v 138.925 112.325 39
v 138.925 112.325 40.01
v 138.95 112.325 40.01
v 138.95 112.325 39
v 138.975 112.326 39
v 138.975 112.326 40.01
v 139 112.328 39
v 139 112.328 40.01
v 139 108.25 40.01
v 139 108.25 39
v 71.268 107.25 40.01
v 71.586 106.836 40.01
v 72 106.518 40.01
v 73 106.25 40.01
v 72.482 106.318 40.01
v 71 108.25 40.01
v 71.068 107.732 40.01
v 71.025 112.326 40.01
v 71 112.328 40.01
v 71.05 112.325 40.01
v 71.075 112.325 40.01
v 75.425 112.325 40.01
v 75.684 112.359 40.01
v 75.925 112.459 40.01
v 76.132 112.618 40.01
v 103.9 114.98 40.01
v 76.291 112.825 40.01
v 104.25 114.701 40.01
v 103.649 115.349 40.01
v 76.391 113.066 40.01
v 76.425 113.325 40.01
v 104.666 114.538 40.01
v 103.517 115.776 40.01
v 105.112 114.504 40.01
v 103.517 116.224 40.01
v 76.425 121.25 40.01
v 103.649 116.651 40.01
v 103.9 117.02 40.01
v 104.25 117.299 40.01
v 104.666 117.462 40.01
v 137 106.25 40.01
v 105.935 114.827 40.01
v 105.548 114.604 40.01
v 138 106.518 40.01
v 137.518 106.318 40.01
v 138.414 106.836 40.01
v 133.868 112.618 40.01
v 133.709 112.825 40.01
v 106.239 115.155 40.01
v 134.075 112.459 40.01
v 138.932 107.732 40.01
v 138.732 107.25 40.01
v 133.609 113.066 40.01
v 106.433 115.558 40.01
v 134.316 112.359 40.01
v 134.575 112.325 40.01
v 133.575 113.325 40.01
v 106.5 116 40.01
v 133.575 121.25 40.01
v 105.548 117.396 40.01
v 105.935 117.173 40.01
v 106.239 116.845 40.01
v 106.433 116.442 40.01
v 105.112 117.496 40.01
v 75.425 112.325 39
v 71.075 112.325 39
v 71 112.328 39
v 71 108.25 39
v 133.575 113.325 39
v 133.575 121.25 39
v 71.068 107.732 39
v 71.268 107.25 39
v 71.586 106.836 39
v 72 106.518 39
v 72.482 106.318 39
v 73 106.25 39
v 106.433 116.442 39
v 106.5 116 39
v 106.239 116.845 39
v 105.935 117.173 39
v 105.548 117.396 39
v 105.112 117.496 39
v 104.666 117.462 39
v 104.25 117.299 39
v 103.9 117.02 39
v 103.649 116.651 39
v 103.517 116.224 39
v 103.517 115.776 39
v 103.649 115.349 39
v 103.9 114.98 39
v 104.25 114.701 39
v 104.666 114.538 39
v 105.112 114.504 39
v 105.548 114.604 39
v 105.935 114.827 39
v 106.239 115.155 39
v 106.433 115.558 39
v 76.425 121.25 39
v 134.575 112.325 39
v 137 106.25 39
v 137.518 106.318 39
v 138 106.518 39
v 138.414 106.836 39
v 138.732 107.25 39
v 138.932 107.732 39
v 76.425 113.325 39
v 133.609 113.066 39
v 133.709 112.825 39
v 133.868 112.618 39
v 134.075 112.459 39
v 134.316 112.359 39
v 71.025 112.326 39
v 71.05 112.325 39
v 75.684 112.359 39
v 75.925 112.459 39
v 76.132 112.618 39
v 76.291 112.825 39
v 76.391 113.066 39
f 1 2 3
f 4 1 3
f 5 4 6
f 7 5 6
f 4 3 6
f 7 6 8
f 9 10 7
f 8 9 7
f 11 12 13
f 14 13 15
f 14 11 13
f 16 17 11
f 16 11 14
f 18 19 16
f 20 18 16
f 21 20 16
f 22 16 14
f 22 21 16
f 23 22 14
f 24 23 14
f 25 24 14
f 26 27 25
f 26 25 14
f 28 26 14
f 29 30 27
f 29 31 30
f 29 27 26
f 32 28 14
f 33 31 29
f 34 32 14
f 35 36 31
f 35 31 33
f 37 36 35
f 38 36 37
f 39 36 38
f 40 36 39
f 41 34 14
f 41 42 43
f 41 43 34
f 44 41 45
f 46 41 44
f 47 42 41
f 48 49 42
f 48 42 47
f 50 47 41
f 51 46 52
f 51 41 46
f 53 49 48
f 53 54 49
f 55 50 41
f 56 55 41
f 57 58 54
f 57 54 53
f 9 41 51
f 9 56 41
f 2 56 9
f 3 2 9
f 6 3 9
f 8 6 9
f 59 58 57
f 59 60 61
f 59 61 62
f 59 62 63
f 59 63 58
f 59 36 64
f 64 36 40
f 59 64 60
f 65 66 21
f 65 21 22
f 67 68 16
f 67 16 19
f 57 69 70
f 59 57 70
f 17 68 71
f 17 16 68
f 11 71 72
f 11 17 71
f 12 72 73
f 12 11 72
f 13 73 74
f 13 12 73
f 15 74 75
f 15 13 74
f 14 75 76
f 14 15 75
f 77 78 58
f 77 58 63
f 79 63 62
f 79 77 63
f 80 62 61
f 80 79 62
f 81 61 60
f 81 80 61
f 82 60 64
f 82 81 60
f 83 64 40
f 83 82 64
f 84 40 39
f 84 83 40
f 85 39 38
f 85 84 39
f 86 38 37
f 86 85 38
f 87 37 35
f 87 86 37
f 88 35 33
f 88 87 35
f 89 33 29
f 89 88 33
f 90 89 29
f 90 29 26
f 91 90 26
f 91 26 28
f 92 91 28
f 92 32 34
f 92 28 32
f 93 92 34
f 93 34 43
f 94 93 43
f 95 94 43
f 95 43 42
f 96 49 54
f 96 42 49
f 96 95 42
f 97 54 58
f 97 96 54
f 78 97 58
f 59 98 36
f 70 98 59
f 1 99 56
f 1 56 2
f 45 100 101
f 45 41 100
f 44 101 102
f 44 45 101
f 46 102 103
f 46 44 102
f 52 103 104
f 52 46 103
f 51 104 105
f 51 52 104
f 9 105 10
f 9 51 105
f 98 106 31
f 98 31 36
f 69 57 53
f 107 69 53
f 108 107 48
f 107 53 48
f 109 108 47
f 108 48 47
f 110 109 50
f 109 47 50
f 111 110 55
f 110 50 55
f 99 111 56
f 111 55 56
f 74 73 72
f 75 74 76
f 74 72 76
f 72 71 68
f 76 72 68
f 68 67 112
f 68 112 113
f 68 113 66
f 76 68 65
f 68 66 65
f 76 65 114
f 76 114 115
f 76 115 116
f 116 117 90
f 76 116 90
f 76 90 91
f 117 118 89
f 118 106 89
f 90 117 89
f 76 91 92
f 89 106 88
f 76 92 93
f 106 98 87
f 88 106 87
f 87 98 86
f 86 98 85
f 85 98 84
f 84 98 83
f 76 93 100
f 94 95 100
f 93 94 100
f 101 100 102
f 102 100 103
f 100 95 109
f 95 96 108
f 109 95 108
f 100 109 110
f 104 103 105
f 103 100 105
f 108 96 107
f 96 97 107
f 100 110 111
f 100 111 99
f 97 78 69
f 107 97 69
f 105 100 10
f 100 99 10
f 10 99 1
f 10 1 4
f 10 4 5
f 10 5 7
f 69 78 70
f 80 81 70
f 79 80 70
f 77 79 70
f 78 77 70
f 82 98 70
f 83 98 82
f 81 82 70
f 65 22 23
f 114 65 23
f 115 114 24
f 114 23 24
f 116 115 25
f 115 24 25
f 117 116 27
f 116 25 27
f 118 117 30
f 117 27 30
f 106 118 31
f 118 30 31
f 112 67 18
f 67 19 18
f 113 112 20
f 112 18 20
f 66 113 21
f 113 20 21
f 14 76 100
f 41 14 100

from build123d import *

# Parameters (mm, degrees)
CYLINDER080_R     = 1.5
CYLINDER080_DEPTH = 10
CYLINDER075_R     = 2.579687
CYLINDER075_DEPTH = 56.5
CYLINDER076_R     = 2.579687
CYLINDER076_DEPTH = 55.5
BOX006_W          = 6.35
BOX006_H          = 15
BOX006_DEPTH      = 10
FILLET005_R       = 1
BOX005_W          = 6.35
BOX005_H          = 15
BOX005_DEPTH      = 10
FILLET004_R       = 1
BOX004_W          = 68
BOX004_H          = 15
BOX004_DEPTH      = 1.01
FILLET003_R       = 2


with BuildPart() as shieldcrosshole004:
    # Cylinder080 → Cylinder080 (new body)
    with BuildSketch(Plane(origin=(105, 116, 34), x_dir=(1, 0, 0), z_dir=(0, 0, 1))):
        Circle(CYLINDER080_R)
    extrude(amount=CYLINDER080_DEPTH)


with BuildPart() as threaded027:
    # Cylinder075 → Cylinder075 (new body)
    with BuildSketch(Plane(origin=(73.25, 179.75, 4), x_dir=(1, 0, 0), z_dir=(0, 0, 1))):
        Circle(CYLINDER075_R)
    extrude(amount=CYLINDER075_DEPTH)


with BuildPart() as threaded028:
    # Cylinder076 → Cylinder076 (new body)
    with BuildSketch(Plane(origin=(136.75, 179.75, 4), x_dir=(1, 0, 0), z_dir=(0, 0, 1))):
        Circle(CYLINDER076_R)
    extrude(amount=CYLINDER076_DEPTH)


with BuildPart() as fillet005:
    # Box006 → Box006 (new body)
    with BuildSketch(Plane(origin=(70.075, 175.825, 36), x_dir=(1, 0, 0), z_dir=(0, 0, 1))):
        with Locations((3.175, 7.5)):
            Rectangle(BOX006_W, BOX006_H)
    extrude(amount=BOX006_DEPTH)

    # Fillet005
    fillet005_edges = [fillet005.edges().sort_by_distance(p)[0] for p in [
        (70.075, 175.825, 41),
        (76.425, 175.825, 41),
    ]]
    fillet(fillet005_edges, radius=FILLET005_R)


with BuildPart() as fillet005_1:
    # Fillet005 placement: moved
    add(fillet005.part.moved(Location((63.5, 0, 0))))


with BuildPart() as fusion033:
    # Box005 → Box005 (new body)
    with BuildSketch(Plane(origin=(70.075, 175.825, 36), x_dir=(1, 0, 0), z_dir=(0, 0, 1))):
        with Locations((3.175, 7.5)):
            Rectangle(BOX005_W, BOX005_H)
    extrude(amount=BOX005_DEPTH)

    # Fillet004
    fillet004_edges = [fusion033.edges().sort_by_distance(p)[0] for p in [
        (70.075, 175.825, 41),
        (76.425, 175.825, 41),
    ]]
    fillet(fillet004_edges, radius=FILLET004_R)

    # Fusion033: union Threaded027, Threaded028, Fillet005
    add(threaded027.part)
    add(threaded028.part)
    add(fillet005_1.part)


with BuildPart() as shieldbar003:
    # Box004 → Box004 (new body)
    with BuildSketch(Plane(origin=(71, 169.75, 39), x_dir=(1, 0, 0), z_dir=(0, 0, 1))):
        with Locations((34, 7.5)):
            Rectangle(BOX004_W, BOX004_H)
    extrude(amount=BOX004_DEPTH)

    # Fillet003
    fillet003_edges = [shieldbar003.edges().sort_by_distance(p)[0] for p in [
        (71, 169.75, 39.505),
        (71, 184.75, 39.505),
        (139, 169.75, 39.505),
        (139, 184.75, 39.505),
    ]]
    fillet(fillet003_edges, radius=FILLET003_R)

    # Cut004: cut Fusion033
    add(fusion033.part, mode=Mode.SUBTRACT)


with BuildPart() as shieldbar003_1:
    # Cut004 placement: moved
    add(shieldbar003.part.moved(Location((0, -63.5, 0))))

    # Cut006: cut ShieldCrossHole004
    add(shieldcrosshole004.part, mode=Mode.SUBTRACT)


solid = shieldbar003_1.part
